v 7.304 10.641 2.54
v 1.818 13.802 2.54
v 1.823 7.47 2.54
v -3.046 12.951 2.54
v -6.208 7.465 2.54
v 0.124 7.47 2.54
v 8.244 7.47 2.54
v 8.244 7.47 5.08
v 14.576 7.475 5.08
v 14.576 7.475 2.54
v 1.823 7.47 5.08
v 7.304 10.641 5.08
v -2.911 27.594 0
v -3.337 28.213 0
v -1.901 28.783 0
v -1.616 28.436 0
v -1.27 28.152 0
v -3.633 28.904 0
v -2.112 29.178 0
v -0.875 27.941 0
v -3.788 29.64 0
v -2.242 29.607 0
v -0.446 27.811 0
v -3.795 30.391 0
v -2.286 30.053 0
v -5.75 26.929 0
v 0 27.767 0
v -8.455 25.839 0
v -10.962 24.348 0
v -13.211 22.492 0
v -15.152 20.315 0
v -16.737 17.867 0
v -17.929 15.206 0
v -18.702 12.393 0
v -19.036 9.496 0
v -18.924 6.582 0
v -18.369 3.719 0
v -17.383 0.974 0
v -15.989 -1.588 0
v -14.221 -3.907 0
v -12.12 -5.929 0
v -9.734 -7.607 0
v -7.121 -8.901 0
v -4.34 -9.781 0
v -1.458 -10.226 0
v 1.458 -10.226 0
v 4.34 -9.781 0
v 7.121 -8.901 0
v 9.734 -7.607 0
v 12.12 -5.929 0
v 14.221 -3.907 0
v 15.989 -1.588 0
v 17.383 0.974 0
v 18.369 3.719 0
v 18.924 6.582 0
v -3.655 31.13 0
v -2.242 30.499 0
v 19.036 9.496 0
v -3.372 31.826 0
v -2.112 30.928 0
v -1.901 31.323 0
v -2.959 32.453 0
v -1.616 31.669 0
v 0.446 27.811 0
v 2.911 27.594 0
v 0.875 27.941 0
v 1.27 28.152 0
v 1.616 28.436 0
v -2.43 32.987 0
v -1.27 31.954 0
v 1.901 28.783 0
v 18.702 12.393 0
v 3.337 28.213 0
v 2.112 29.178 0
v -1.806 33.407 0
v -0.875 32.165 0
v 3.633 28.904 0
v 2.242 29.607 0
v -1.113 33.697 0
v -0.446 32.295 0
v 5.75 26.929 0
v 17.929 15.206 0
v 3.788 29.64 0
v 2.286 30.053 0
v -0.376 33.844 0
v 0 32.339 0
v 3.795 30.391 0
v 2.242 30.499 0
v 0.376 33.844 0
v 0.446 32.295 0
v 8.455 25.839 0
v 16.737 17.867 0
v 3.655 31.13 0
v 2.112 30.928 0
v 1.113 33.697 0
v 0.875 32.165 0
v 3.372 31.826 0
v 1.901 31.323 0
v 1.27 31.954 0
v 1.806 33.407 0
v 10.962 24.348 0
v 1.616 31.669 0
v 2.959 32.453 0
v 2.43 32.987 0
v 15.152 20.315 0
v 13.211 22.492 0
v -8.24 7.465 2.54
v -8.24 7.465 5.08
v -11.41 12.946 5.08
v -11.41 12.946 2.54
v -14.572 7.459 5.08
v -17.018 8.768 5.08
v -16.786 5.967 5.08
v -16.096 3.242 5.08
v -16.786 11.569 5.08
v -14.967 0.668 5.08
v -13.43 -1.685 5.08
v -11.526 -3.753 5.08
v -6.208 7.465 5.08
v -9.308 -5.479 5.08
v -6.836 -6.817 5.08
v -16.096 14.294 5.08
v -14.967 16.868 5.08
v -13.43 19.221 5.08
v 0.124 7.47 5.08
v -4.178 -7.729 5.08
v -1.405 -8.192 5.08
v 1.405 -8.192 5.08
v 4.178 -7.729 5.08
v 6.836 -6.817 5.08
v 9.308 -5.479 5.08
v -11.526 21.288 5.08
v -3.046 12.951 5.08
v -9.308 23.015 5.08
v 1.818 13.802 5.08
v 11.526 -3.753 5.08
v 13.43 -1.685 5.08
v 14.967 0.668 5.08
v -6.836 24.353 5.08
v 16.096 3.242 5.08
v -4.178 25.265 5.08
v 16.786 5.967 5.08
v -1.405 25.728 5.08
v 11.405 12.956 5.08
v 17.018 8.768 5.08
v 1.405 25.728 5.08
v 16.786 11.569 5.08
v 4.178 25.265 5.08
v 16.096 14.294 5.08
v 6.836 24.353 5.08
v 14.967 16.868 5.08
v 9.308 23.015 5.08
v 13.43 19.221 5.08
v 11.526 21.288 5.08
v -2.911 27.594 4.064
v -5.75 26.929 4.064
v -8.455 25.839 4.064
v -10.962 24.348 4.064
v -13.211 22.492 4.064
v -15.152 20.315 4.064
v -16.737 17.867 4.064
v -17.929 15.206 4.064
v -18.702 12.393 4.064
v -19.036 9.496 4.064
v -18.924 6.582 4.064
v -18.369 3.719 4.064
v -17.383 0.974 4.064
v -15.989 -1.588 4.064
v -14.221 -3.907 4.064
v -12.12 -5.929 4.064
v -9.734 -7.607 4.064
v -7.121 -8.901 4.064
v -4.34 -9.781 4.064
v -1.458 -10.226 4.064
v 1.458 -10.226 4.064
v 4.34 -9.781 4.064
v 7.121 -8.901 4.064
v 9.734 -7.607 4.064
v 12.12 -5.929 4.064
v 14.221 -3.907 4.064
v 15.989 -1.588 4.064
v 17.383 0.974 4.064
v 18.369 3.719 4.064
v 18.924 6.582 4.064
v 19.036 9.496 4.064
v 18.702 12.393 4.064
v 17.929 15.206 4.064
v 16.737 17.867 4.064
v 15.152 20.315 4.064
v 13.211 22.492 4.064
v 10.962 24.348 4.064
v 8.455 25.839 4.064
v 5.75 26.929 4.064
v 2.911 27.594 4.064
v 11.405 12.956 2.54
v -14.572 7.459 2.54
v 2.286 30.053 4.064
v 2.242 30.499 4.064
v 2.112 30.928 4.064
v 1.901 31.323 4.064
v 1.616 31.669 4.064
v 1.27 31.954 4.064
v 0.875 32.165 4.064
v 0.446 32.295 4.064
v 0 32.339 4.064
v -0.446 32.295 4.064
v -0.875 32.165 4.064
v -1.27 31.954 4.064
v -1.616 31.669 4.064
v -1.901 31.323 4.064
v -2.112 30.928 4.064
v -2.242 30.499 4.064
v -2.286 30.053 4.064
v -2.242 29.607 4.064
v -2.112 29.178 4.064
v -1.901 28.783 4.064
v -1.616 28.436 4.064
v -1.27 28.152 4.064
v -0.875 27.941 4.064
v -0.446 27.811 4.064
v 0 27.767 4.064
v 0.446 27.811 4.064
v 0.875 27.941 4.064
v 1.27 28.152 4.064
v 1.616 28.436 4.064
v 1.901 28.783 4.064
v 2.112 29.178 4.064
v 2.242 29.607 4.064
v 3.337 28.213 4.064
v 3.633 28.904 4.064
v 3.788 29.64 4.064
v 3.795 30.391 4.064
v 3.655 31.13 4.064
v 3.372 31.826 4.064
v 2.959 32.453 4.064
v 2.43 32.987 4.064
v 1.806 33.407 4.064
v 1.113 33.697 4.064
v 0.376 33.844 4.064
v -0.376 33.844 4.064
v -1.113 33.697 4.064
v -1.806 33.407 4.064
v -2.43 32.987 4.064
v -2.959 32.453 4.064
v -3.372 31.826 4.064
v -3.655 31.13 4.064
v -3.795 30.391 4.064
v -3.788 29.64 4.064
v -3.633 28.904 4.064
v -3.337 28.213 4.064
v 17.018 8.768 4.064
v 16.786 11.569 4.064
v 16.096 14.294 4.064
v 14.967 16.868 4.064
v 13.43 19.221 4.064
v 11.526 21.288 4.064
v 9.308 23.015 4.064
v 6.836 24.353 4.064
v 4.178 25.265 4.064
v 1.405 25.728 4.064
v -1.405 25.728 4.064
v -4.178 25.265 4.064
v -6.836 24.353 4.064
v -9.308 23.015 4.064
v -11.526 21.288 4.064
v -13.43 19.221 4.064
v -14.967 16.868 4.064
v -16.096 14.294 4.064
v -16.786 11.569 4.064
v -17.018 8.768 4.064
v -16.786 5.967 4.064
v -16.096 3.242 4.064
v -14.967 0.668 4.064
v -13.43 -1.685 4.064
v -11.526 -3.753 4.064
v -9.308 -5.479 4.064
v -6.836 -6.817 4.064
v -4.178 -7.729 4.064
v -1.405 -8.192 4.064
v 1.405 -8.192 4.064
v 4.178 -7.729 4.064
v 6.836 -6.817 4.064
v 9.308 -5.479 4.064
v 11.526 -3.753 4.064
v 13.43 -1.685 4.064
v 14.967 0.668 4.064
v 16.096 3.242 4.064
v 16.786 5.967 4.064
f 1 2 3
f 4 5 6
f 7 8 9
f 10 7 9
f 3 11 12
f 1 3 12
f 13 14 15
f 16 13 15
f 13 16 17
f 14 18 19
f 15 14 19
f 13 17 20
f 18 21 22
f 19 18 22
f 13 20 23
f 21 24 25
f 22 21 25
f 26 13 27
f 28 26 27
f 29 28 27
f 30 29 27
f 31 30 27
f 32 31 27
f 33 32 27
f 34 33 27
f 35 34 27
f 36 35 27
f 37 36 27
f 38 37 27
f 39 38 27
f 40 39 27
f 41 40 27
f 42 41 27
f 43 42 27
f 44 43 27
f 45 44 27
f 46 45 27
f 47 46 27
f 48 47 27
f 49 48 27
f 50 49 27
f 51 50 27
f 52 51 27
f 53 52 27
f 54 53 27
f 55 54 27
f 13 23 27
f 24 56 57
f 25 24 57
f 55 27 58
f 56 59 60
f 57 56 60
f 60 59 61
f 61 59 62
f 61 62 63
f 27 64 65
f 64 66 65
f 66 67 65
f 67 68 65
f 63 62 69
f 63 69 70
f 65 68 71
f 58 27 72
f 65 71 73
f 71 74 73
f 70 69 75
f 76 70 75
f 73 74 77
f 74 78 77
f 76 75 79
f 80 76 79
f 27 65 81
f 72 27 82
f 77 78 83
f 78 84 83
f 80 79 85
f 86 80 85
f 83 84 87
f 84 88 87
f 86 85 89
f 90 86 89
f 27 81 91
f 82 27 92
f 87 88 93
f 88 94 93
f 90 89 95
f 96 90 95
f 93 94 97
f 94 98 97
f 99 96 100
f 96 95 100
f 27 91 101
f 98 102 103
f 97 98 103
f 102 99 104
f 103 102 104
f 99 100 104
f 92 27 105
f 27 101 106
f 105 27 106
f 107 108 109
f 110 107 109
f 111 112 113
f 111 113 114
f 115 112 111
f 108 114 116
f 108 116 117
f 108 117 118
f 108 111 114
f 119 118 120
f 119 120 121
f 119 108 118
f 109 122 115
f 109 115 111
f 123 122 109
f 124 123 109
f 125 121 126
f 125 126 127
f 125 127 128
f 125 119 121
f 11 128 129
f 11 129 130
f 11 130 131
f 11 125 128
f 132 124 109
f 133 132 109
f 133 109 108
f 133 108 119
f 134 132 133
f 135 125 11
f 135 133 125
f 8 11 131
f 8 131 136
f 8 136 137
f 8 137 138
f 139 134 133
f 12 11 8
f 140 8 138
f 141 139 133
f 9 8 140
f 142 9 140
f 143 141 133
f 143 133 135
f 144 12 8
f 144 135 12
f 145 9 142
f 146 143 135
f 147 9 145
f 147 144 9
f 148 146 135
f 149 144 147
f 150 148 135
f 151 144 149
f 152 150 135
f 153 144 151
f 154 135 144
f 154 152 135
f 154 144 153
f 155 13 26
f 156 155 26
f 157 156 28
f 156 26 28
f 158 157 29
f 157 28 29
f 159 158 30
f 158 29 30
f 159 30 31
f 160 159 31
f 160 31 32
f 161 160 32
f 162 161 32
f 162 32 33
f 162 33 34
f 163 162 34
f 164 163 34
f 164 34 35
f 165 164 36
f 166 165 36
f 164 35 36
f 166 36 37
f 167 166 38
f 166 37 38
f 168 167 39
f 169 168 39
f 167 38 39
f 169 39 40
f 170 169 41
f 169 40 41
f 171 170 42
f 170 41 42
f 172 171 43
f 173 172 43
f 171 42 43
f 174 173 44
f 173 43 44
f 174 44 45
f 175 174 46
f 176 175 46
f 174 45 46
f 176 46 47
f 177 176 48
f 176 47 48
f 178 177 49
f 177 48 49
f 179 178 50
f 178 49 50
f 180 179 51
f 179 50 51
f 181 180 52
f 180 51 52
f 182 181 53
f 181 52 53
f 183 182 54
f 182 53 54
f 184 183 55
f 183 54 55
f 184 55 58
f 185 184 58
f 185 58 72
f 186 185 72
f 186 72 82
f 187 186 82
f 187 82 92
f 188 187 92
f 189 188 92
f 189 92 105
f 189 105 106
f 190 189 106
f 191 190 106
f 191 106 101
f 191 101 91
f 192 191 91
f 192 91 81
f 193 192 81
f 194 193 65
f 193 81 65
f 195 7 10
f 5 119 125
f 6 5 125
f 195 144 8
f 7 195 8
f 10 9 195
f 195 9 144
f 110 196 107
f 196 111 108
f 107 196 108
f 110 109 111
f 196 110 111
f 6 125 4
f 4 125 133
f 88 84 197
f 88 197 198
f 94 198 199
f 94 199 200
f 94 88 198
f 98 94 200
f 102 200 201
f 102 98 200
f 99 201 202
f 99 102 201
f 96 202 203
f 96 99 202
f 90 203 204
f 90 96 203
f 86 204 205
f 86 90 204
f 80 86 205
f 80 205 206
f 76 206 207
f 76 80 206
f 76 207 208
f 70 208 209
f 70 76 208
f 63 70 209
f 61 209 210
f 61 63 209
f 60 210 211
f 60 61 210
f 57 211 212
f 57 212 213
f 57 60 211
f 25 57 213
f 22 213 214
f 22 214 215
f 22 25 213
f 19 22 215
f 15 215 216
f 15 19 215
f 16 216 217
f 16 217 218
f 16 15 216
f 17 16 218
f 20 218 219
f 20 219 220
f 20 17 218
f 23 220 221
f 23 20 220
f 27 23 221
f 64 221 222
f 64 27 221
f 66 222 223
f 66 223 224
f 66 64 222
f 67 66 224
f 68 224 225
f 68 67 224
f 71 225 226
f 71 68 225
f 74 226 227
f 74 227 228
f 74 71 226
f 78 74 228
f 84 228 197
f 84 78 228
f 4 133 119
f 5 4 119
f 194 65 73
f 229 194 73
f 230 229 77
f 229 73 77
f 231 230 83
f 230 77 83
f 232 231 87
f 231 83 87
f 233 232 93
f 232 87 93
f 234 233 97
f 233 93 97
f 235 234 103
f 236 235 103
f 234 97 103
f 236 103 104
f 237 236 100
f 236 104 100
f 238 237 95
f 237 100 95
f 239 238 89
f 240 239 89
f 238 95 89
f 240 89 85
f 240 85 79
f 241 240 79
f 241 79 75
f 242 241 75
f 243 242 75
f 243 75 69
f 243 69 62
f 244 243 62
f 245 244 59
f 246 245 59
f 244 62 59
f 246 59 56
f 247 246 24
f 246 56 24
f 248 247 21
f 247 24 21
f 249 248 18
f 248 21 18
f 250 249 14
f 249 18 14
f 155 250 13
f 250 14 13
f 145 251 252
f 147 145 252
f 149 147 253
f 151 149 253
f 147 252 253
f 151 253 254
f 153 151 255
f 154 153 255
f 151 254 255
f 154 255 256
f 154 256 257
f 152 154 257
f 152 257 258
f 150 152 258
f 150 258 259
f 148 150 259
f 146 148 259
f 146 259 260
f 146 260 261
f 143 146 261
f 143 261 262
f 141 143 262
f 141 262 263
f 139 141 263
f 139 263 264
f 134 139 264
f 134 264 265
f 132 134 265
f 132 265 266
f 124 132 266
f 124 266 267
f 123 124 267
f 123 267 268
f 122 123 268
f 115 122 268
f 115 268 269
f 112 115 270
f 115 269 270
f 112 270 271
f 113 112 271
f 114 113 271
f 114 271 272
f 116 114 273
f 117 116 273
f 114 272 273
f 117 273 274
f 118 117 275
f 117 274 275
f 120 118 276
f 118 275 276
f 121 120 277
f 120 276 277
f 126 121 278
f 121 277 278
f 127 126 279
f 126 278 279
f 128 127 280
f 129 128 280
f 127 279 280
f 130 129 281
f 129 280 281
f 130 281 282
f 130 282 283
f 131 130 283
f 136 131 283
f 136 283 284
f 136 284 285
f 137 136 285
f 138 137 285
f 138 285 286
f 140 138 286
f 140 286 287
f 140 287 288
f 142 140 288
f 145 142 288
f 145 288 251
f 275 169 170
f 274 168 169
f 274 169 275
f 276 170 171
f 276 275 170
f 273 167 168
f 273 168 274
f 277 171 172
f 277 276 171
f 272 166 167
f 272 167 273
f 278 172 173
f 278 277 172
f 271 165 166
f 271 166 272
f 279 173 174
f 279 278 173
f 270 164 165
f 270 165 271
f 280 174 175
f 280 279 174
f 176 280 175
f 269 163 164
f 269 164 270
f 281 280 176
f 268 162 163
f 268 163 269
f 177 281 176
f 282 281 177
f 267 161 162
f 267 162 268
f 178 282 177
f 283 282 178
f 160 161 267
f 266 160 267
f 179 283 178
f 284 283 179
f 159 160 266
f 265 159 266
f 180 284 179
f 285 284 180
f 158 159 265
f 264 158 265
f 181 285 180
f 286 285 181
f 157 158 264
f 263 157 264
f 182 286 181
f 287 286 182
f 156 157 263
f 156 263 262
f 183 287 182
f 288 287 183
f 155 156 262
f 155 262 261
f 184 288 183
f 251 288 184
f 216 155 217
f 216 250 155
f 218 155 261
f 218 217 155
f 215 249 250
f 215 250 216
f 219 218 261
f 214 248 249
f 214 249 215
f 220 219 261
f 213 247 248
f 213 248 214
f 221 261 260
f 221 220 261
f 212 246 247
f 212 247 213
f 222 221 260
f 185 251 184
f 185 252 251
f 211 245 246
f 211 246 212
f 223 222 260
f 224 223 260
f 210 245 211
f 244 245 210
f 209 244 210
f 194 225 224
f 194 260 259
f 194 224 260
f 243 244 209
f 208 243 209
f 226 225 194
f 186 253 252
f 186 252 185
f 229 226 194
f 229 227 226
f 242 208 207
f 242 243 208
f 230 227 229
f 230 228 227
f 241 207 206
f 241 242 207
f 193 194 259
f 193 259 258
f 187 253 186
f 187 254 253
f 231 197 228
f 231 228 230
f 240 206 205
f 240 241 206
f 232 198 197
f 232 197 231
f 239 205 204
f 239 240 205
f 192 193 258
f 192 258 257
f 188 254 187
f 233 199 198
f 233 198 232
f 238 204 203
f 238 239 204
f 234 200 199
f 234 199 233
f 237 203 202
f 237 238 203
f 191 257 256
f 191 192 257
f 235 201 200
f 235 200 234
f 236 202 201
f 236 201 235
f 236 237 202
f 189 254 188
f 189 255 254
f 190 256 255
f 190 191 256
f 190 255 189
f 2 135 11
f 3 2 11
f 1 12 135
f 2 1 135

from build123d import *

# Parameters (mm, degrees)
F0_R     = 17.018
F0_R_2   = 2.286
F1_DEPTH = 4.064
F2_DEPTH = 5.08
F4_DEPTH = 2.54


with BuildPart() as f1:
    # F0 (on Top) → F1 (new body)
    with BuildSketch(Plane.XY):
        with BuildLine():
            ThreePointArc((-2.910637, 27.594249), (0, -10.282081), (2.910637, 27.594249))
            ThreePointArc((2.910637, 27.594249), (0, 33.862762), (-2.910637, 27.594249))
        make_face()
        with Locations((0, 8.767919)):
            Circle(F0_R, mode=Mode.SUBTRACT)
        with Locations((0, 30.052762)):
            Circle(F0_R_2, mode=Mode.SUBTRACT)
    extrude(amount=F1_DEPTH)

    # F0 (on Top) → F2 (join)
    with BuildSketch(Plane.XY):
        with Locations((0, 8.767919)):
            Circle(F0_R)
    extrude(amount=F2_DEPTH)

    # F3 (on face) → F4 (cut)
    with BuildSketch(Plane.XY.offset(5.08)):
        Polygon((-8.239756, 7.464734), (-11.410307, 12.945793), (-14.571768, 7.459487), align=None)
        Polygon((0.124255, 7.469981), (-3.046295, 12.95104), (-6.207756, 7.464734), align=None)
        Polygon((1.823385, 7.469981), (7.304444, 10.640532), (1.818137, 13.801993), align=None)
        Polygon((14.575767, 7.475229), (11.405217, 12.956288), (8.243755, 7.469981), align=None)
    extrude(amount=-F4_DEPTH, mode=Mode.SUBTRACT)


solid = f1.part
